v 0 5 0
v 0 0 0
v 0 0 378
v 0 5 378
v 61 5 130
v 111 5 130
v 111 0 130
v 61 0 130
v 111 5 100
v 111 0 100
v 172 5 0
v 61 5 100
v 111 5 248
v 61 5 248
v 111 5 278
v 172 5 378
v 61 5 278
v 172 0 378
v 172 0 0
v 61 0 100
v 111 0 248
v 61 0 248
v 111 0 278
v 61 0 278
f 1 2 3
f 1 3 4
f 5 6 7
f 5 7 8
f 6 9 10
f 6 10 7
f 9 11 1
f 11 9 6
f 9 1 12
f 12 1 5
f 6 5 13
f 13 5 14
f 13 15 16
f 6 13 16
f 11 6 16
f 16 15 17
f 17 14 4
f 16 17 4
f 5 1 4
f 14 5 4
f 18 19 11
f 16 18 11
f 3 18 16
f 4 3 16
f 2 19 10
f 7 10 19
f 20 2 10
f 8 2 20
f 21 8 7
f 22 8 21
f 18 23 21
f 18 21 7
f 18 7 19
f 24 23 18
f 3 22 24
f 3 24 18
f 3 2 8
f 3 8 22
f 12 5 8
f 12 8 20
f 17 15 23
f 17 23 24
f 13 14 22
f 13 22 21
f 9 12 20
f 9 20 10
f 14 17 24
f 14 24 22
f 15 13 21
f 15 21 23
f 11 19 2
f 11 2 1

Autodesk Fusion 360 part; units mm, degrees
sketch "Sketch1" plane through (0, 0, 0) normal (0, 1, 0) x (1, 0, 0)
  line L0 (0, 0) -> (170, 0)
  line L1 (170, 0) -> (170, -376)
  line L2 (170, -376) -> (0, -376)
  line L3 (0, -376) -> (0, 0)
  dimension "d1" = 170
  dimension "d2" = 376
extrude "Extrude1" add sketch "Sketch1" along normal blind 5
sketch "Sketch2" plane through (0, 0, 0) normal (-1, 0, 0) x (0, 0, 1)
  line L0 (0, 0) -> (376, 0)
  line L1 (376, 0) -> (376, 5)
  line L2 (376, 5) -> (0, 5)
  line L3 (0, 5) -> (0, 0)
extrude "Extrude2" cut 1 faces at (56.6667, 1.6667, 0) along direction (0, 0, 1) blind 3
extrude "Extrude3" cut 1 faces at (170, 1.6667, 127.3333) along direction (-1, 0, 0) blind 3
extrude "Extrude4" add 1 faces at (55.6667, 1.6667, 3) along direction (0, 0, -1) blind 3
extrude "Extrude5" add 1 faces at (167, 1.6667, 250.6667) along direction (1, 0, 0) blind 2
extrude "Extrude6" add 1 faces at (56.3333, 1.6667, 376) along direction (0, 0, 1) blind 2
extrude "Extrude7" add 1 faces at (169, 3.3333, 252) along direction (1, 0, 0) blind 3
sketch "Sketch3" plane through (0, 5, 0) normal (0, 1, 0) x (-1, 0, 0)
  line L0 (-172, 0) -> (0, 0)
  line L1 (0, 0) -> (0, 378)
  line L2 (0, 378) -> (-172, 378)
  line L3 (-172, 378) -> (-172, 0)
  line L4 (-61, 248) -> (-111, 248)
  line L5 (-111, 248) -> (-111, 278)
  line L6 (-111, 278) -> (-61, 278)
  line L7 (-61, 278) -> (-61, 248)
  line L8 (-61, 100) -> (-111, 100)
  line L9 (-111, 100) -> (-111, 130)
  line L10 (-111, 130) -> (-61, 130)
  line L11 (-61, 130) -> (-61, 100)
  dimension "d17" = 50
  dimension "d18" = 30
  dimension "d19" = 50
  dimension "d20" = 30
  dimension "d21" = 100
  dimension "d22" = 100
  dimension "d23" = 61
  dimension "d24" = 61
extrude "Extrude8" cut sketch "Sketch3" against normal blind 5 contours L4 L5 L6 L7 | L8 L9 L10 L11
